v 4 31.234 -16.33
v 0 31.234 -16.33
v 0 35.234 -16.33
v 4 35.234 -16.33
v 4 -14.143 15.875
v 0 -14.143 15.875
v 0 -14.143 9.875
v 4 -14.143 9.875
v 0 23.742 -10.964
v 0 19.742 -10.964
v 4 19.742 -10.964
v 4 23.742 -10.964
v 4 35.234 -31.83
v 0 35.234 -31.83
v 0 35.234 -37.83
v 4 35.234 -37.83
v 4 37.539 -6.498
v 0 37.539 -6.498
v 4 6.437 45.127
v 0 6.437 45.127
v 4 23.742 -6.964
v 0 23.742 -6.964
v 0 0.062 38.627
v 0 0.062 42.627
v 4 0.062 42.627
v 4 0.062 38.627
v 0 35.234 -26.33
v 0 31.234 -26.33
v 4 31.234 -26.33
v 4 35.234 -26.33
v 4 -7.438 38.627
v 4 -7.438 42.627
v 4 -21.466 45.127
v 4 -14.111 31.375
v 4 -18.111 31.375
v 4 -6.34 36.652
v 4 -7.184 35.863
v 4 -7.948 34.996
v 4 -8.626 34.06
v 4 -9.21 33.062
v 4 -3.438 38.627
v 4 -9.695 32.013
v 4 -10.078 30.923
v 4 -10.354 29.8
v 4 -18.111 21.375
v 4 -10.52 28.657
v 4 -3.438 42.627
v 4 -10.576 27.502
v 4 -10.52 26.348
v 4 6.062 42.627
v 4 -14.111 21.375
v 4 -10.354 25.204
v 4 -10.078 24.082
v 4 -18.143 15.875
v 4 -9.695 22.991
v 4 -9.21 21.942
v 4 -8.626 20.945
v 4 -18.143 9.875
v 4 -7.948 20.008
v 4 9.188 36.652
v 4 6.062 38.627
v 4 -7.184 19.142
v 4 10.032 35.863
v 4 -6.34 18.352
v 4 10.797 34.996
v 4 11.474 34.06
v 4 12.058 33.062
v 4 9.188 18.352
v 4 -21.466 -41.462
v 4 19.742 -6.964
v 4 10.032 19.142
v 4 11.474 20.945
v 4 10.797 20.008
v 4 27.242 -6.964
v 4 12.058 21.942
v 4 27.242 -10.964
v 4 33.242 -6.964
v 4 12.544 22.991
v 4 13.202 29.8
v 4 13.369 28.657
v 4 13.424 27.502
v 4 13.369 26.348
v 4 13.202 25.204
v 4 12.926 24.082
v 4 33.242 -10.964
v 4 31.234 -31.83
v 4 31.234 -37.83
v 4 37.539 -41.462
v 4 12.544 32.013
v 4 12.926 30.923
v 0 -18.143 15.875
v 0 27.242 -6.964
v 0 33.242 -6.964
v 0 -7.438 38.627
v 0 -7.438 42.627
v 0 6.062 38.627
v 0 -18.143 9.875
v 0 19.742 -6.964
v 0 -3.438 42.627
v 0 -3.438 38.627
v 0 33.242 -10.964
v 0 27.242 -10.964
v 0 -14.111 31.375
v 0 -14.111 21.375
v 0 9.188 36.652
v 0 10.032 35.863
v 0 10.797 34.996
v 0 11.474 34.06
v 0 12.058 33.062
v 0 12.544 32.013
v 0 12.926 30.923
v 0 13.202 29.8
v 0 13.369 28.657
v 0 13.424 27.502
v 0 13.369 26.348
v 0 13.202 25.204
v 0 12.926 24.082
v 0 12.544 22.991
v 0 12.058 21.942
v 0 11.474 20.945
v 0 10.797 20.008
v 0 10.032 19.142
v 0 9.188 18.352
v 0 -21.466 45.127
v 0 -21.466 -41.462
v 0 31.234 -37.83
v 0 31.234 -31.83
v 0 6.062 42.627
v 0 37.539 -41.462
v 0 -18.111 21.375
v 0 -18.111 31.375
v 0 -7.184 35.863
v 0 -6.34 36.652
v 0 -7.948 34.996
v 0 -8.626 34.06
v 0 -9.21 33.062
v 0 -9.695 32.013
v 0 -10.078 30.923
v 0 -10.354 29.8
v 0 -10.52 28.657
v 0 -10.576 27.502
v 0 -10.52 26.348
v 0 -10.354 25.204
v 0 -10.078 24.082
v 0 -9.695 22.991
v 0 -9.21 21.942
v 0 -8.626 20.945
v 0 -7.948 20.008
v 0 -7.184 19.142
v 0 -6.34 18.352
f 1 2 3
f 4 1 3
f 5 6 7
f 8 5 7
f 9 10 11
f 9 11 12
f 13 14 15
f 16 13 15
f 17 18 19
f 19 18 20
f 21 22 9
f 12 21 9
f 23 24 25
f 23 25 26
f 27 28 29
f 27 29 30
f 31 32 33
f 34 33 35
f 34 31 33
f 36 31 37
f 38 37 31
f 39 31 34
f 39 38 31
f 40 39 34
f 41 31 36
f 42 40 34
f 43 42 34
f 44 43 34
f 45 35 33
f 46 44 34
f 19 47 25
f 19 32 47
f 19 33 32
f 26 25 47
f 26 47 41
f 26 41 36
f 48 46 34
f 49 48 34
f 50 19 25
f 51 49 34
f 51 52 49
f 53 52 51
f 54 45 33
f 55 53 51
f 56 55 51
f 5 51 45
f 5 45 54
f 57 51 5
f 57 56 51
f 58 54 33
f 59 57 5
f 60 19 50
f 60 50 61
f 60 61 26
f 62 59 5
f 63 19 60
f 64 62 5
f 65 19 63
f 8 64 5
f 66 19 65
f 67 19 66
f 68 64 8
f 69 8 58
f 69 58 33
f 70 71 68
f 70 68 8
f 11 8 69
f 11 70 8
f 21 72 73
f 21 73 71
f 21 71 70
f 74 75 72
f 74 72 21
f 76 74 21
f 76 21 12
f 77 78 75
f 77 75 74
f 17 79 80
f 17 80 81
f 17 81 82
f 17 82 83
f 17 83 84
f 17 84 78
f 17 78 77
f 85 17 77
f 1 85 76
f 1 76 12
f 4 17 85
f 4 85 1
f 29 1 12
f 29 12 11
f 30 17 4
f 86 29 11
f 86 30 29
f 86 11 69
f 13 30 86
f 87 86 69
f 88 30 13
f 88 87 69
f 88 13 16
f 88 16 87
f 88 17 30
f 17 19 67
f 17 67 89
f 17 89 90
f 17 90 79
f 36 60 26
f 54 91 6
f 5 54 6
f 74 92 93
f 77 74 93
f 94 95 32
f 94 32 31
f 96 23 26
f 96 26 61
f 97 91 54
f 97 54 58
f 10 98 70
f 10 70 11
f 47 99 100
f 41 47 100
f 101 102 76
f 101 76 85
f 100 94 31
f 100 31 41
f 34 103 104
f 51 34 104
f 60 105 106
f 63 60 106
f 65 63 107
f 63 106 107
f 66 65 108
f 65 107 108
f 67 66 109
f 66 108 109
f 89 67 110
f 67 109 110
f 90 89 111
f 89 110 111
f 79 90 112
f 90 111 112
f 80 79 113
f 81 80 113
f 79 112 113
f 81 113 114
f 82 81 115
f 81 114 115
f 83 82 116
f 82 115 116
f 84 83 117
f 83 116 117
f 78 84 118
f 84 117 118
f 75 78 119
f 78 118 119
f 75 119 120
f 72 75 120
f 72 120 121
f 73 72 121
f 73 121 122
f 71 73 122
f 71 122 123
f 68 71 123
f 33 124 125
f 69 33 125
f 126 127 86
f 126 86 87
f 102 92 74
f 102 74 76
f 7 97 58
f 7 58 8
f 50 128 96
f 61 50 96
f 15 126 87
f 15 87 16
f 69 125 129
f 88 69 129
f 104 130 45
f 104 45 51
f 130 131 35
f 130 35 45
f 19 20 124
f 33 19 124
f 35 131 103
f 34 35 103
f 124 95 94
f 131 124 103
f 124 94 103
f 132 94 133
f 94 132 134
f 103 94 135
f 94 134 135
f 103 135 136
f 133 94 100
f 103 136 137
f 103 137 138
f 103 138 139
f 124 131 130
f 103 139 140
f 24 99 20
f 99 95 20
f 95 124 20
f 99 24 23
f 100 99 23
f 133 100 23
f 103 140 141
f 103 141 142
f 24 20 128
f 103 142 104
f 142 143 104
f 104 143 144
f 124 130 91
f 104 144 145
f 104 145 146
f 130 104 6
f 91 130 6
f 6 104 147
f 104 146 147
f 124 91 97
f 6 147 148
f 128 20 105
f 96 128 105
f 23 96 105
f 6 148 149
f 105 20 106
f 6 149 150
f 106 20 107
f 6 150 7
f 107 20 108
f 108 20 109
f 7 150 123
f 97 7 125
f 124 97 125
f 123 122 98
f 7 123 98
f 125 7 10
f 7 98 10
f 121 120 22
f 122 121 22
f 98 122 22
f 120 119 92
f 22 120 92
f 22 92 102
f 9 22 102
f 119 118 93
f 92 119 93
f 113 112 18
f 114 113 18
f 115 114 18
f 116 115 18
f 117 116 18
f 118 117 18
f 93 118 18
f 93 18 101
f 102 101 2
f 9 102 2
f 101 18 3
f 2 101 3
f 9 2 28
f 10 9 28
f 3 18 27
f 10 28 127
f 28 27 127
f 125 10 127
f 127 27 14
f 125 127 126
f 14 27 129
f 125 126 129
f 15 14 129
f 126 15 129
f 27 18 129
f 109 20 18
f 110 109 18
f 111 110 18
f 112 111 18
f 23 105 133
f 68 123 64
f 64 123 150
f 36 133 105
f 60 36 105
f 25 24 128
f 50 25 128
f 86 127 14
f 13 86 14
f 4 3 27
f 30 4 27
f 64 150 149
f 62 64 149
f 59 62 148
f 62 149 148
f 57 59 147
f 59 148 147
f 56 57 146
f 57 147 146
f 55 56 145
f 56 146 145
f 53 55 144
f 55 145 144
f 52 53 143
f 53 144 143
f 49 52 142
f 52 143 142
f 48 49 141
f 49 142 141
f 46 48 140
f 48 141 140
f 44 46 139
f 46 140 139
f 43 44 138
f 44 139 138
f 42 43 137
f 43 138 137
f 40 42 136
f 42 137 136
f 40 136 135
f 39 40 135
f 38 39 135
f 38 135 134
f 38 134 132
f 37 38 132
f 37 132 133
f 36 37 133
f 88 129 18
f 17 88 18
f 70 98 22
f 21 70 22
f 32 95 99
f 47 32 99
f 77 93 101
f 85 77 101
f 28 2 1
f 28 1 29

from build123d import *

# Parameters (mm, degrees)
SKETCH1_W           = 10
SKETCH1_H           = 4
SKETCH1_W_2         = 4
SKETCH1_H_2         = 6
SKETCH1_W_3         = 6
BOSS_EXTRUDE1_DEPTH = 4


with BuildPart() as part:
    # Sketch1 → Boss-Extrude1 (new body)
    with BuildSketch(Plane(origin=(0, 0, 0), x_dir=(0, 0, -1), z_dir=(1, 0, 0))):
        Polygon((-45.126561272, -21.465862465), (41.462435166, -21.465862465), (41.462435166, 37.538855), (6.497816801, 37.538855), (-45.126561272, 6.437068622), align=None)
        with Locations((21.33035671, 33.233983224)):
            Rectangle(SKETCH1_W, SKETCH1_H, mode=Mode.SUBTRACT)
        with Locations((-40.626561272, 3.062484248)):
            Rectangle(SKETCH1_W_2, SKETCH1_H_2, mode=Mode.SUBTRACT)
        with Locations((-40.626561272, -5.437515752)):
            Rectangle(SKETCH1_W_2, SKETCH1_H, mode=Mode.SUBTRACT)
        with Locations((-26.374737007, -16.111091518)):
            Rectangle(SKETCH1_W, SKETCH1_H, mode=Mode.SUBTRACT)
        with Locations((-12.874826786, -16.142516965)):
            Rectangle(SKETCH1_W_3, SKETCH1_H, mode=Mode.SUBTRACT)
        with Locations((34.83035671, 33.233983224)):
            Rectangle(SKETCH1_W_3, SKETCH1_H, mode=Mode.SUBTRACT)
        with Locations((8.963743124, 30.24228943)):
            Rectangle(SKETCH1_W_2, SKETCH1_H_2, mode=Mode.SUBTRACT)
        with Locations((8.963743124, 21.74228943)):
            Rectangle(SKETCH1_W_2, SKETCH1_H, mode=Mode.SUBTRACT)
        with BuildLine():
            Line((-36.652183199, -6.33954665), (-36.652183199, 9.188170503))
            ThreePointArc((-36.652183199, 9.188170503), (-27.502183199, 13.424311927), (-18.352183199, 9.188170503))
            Line((-18.352183199, 9.188170503), (-18.352183199, -6.33954665))
            ThreePointArc((-18.352183199, -6.33954665), (-27.502183199, -10.575688073), (-36.652183199, -6.33954665))
        make_face(mode=Mode.SUBTRACT)
    extrude(amount=BOSS_EXTRUDE1_DEPTH)


solid = part.part
